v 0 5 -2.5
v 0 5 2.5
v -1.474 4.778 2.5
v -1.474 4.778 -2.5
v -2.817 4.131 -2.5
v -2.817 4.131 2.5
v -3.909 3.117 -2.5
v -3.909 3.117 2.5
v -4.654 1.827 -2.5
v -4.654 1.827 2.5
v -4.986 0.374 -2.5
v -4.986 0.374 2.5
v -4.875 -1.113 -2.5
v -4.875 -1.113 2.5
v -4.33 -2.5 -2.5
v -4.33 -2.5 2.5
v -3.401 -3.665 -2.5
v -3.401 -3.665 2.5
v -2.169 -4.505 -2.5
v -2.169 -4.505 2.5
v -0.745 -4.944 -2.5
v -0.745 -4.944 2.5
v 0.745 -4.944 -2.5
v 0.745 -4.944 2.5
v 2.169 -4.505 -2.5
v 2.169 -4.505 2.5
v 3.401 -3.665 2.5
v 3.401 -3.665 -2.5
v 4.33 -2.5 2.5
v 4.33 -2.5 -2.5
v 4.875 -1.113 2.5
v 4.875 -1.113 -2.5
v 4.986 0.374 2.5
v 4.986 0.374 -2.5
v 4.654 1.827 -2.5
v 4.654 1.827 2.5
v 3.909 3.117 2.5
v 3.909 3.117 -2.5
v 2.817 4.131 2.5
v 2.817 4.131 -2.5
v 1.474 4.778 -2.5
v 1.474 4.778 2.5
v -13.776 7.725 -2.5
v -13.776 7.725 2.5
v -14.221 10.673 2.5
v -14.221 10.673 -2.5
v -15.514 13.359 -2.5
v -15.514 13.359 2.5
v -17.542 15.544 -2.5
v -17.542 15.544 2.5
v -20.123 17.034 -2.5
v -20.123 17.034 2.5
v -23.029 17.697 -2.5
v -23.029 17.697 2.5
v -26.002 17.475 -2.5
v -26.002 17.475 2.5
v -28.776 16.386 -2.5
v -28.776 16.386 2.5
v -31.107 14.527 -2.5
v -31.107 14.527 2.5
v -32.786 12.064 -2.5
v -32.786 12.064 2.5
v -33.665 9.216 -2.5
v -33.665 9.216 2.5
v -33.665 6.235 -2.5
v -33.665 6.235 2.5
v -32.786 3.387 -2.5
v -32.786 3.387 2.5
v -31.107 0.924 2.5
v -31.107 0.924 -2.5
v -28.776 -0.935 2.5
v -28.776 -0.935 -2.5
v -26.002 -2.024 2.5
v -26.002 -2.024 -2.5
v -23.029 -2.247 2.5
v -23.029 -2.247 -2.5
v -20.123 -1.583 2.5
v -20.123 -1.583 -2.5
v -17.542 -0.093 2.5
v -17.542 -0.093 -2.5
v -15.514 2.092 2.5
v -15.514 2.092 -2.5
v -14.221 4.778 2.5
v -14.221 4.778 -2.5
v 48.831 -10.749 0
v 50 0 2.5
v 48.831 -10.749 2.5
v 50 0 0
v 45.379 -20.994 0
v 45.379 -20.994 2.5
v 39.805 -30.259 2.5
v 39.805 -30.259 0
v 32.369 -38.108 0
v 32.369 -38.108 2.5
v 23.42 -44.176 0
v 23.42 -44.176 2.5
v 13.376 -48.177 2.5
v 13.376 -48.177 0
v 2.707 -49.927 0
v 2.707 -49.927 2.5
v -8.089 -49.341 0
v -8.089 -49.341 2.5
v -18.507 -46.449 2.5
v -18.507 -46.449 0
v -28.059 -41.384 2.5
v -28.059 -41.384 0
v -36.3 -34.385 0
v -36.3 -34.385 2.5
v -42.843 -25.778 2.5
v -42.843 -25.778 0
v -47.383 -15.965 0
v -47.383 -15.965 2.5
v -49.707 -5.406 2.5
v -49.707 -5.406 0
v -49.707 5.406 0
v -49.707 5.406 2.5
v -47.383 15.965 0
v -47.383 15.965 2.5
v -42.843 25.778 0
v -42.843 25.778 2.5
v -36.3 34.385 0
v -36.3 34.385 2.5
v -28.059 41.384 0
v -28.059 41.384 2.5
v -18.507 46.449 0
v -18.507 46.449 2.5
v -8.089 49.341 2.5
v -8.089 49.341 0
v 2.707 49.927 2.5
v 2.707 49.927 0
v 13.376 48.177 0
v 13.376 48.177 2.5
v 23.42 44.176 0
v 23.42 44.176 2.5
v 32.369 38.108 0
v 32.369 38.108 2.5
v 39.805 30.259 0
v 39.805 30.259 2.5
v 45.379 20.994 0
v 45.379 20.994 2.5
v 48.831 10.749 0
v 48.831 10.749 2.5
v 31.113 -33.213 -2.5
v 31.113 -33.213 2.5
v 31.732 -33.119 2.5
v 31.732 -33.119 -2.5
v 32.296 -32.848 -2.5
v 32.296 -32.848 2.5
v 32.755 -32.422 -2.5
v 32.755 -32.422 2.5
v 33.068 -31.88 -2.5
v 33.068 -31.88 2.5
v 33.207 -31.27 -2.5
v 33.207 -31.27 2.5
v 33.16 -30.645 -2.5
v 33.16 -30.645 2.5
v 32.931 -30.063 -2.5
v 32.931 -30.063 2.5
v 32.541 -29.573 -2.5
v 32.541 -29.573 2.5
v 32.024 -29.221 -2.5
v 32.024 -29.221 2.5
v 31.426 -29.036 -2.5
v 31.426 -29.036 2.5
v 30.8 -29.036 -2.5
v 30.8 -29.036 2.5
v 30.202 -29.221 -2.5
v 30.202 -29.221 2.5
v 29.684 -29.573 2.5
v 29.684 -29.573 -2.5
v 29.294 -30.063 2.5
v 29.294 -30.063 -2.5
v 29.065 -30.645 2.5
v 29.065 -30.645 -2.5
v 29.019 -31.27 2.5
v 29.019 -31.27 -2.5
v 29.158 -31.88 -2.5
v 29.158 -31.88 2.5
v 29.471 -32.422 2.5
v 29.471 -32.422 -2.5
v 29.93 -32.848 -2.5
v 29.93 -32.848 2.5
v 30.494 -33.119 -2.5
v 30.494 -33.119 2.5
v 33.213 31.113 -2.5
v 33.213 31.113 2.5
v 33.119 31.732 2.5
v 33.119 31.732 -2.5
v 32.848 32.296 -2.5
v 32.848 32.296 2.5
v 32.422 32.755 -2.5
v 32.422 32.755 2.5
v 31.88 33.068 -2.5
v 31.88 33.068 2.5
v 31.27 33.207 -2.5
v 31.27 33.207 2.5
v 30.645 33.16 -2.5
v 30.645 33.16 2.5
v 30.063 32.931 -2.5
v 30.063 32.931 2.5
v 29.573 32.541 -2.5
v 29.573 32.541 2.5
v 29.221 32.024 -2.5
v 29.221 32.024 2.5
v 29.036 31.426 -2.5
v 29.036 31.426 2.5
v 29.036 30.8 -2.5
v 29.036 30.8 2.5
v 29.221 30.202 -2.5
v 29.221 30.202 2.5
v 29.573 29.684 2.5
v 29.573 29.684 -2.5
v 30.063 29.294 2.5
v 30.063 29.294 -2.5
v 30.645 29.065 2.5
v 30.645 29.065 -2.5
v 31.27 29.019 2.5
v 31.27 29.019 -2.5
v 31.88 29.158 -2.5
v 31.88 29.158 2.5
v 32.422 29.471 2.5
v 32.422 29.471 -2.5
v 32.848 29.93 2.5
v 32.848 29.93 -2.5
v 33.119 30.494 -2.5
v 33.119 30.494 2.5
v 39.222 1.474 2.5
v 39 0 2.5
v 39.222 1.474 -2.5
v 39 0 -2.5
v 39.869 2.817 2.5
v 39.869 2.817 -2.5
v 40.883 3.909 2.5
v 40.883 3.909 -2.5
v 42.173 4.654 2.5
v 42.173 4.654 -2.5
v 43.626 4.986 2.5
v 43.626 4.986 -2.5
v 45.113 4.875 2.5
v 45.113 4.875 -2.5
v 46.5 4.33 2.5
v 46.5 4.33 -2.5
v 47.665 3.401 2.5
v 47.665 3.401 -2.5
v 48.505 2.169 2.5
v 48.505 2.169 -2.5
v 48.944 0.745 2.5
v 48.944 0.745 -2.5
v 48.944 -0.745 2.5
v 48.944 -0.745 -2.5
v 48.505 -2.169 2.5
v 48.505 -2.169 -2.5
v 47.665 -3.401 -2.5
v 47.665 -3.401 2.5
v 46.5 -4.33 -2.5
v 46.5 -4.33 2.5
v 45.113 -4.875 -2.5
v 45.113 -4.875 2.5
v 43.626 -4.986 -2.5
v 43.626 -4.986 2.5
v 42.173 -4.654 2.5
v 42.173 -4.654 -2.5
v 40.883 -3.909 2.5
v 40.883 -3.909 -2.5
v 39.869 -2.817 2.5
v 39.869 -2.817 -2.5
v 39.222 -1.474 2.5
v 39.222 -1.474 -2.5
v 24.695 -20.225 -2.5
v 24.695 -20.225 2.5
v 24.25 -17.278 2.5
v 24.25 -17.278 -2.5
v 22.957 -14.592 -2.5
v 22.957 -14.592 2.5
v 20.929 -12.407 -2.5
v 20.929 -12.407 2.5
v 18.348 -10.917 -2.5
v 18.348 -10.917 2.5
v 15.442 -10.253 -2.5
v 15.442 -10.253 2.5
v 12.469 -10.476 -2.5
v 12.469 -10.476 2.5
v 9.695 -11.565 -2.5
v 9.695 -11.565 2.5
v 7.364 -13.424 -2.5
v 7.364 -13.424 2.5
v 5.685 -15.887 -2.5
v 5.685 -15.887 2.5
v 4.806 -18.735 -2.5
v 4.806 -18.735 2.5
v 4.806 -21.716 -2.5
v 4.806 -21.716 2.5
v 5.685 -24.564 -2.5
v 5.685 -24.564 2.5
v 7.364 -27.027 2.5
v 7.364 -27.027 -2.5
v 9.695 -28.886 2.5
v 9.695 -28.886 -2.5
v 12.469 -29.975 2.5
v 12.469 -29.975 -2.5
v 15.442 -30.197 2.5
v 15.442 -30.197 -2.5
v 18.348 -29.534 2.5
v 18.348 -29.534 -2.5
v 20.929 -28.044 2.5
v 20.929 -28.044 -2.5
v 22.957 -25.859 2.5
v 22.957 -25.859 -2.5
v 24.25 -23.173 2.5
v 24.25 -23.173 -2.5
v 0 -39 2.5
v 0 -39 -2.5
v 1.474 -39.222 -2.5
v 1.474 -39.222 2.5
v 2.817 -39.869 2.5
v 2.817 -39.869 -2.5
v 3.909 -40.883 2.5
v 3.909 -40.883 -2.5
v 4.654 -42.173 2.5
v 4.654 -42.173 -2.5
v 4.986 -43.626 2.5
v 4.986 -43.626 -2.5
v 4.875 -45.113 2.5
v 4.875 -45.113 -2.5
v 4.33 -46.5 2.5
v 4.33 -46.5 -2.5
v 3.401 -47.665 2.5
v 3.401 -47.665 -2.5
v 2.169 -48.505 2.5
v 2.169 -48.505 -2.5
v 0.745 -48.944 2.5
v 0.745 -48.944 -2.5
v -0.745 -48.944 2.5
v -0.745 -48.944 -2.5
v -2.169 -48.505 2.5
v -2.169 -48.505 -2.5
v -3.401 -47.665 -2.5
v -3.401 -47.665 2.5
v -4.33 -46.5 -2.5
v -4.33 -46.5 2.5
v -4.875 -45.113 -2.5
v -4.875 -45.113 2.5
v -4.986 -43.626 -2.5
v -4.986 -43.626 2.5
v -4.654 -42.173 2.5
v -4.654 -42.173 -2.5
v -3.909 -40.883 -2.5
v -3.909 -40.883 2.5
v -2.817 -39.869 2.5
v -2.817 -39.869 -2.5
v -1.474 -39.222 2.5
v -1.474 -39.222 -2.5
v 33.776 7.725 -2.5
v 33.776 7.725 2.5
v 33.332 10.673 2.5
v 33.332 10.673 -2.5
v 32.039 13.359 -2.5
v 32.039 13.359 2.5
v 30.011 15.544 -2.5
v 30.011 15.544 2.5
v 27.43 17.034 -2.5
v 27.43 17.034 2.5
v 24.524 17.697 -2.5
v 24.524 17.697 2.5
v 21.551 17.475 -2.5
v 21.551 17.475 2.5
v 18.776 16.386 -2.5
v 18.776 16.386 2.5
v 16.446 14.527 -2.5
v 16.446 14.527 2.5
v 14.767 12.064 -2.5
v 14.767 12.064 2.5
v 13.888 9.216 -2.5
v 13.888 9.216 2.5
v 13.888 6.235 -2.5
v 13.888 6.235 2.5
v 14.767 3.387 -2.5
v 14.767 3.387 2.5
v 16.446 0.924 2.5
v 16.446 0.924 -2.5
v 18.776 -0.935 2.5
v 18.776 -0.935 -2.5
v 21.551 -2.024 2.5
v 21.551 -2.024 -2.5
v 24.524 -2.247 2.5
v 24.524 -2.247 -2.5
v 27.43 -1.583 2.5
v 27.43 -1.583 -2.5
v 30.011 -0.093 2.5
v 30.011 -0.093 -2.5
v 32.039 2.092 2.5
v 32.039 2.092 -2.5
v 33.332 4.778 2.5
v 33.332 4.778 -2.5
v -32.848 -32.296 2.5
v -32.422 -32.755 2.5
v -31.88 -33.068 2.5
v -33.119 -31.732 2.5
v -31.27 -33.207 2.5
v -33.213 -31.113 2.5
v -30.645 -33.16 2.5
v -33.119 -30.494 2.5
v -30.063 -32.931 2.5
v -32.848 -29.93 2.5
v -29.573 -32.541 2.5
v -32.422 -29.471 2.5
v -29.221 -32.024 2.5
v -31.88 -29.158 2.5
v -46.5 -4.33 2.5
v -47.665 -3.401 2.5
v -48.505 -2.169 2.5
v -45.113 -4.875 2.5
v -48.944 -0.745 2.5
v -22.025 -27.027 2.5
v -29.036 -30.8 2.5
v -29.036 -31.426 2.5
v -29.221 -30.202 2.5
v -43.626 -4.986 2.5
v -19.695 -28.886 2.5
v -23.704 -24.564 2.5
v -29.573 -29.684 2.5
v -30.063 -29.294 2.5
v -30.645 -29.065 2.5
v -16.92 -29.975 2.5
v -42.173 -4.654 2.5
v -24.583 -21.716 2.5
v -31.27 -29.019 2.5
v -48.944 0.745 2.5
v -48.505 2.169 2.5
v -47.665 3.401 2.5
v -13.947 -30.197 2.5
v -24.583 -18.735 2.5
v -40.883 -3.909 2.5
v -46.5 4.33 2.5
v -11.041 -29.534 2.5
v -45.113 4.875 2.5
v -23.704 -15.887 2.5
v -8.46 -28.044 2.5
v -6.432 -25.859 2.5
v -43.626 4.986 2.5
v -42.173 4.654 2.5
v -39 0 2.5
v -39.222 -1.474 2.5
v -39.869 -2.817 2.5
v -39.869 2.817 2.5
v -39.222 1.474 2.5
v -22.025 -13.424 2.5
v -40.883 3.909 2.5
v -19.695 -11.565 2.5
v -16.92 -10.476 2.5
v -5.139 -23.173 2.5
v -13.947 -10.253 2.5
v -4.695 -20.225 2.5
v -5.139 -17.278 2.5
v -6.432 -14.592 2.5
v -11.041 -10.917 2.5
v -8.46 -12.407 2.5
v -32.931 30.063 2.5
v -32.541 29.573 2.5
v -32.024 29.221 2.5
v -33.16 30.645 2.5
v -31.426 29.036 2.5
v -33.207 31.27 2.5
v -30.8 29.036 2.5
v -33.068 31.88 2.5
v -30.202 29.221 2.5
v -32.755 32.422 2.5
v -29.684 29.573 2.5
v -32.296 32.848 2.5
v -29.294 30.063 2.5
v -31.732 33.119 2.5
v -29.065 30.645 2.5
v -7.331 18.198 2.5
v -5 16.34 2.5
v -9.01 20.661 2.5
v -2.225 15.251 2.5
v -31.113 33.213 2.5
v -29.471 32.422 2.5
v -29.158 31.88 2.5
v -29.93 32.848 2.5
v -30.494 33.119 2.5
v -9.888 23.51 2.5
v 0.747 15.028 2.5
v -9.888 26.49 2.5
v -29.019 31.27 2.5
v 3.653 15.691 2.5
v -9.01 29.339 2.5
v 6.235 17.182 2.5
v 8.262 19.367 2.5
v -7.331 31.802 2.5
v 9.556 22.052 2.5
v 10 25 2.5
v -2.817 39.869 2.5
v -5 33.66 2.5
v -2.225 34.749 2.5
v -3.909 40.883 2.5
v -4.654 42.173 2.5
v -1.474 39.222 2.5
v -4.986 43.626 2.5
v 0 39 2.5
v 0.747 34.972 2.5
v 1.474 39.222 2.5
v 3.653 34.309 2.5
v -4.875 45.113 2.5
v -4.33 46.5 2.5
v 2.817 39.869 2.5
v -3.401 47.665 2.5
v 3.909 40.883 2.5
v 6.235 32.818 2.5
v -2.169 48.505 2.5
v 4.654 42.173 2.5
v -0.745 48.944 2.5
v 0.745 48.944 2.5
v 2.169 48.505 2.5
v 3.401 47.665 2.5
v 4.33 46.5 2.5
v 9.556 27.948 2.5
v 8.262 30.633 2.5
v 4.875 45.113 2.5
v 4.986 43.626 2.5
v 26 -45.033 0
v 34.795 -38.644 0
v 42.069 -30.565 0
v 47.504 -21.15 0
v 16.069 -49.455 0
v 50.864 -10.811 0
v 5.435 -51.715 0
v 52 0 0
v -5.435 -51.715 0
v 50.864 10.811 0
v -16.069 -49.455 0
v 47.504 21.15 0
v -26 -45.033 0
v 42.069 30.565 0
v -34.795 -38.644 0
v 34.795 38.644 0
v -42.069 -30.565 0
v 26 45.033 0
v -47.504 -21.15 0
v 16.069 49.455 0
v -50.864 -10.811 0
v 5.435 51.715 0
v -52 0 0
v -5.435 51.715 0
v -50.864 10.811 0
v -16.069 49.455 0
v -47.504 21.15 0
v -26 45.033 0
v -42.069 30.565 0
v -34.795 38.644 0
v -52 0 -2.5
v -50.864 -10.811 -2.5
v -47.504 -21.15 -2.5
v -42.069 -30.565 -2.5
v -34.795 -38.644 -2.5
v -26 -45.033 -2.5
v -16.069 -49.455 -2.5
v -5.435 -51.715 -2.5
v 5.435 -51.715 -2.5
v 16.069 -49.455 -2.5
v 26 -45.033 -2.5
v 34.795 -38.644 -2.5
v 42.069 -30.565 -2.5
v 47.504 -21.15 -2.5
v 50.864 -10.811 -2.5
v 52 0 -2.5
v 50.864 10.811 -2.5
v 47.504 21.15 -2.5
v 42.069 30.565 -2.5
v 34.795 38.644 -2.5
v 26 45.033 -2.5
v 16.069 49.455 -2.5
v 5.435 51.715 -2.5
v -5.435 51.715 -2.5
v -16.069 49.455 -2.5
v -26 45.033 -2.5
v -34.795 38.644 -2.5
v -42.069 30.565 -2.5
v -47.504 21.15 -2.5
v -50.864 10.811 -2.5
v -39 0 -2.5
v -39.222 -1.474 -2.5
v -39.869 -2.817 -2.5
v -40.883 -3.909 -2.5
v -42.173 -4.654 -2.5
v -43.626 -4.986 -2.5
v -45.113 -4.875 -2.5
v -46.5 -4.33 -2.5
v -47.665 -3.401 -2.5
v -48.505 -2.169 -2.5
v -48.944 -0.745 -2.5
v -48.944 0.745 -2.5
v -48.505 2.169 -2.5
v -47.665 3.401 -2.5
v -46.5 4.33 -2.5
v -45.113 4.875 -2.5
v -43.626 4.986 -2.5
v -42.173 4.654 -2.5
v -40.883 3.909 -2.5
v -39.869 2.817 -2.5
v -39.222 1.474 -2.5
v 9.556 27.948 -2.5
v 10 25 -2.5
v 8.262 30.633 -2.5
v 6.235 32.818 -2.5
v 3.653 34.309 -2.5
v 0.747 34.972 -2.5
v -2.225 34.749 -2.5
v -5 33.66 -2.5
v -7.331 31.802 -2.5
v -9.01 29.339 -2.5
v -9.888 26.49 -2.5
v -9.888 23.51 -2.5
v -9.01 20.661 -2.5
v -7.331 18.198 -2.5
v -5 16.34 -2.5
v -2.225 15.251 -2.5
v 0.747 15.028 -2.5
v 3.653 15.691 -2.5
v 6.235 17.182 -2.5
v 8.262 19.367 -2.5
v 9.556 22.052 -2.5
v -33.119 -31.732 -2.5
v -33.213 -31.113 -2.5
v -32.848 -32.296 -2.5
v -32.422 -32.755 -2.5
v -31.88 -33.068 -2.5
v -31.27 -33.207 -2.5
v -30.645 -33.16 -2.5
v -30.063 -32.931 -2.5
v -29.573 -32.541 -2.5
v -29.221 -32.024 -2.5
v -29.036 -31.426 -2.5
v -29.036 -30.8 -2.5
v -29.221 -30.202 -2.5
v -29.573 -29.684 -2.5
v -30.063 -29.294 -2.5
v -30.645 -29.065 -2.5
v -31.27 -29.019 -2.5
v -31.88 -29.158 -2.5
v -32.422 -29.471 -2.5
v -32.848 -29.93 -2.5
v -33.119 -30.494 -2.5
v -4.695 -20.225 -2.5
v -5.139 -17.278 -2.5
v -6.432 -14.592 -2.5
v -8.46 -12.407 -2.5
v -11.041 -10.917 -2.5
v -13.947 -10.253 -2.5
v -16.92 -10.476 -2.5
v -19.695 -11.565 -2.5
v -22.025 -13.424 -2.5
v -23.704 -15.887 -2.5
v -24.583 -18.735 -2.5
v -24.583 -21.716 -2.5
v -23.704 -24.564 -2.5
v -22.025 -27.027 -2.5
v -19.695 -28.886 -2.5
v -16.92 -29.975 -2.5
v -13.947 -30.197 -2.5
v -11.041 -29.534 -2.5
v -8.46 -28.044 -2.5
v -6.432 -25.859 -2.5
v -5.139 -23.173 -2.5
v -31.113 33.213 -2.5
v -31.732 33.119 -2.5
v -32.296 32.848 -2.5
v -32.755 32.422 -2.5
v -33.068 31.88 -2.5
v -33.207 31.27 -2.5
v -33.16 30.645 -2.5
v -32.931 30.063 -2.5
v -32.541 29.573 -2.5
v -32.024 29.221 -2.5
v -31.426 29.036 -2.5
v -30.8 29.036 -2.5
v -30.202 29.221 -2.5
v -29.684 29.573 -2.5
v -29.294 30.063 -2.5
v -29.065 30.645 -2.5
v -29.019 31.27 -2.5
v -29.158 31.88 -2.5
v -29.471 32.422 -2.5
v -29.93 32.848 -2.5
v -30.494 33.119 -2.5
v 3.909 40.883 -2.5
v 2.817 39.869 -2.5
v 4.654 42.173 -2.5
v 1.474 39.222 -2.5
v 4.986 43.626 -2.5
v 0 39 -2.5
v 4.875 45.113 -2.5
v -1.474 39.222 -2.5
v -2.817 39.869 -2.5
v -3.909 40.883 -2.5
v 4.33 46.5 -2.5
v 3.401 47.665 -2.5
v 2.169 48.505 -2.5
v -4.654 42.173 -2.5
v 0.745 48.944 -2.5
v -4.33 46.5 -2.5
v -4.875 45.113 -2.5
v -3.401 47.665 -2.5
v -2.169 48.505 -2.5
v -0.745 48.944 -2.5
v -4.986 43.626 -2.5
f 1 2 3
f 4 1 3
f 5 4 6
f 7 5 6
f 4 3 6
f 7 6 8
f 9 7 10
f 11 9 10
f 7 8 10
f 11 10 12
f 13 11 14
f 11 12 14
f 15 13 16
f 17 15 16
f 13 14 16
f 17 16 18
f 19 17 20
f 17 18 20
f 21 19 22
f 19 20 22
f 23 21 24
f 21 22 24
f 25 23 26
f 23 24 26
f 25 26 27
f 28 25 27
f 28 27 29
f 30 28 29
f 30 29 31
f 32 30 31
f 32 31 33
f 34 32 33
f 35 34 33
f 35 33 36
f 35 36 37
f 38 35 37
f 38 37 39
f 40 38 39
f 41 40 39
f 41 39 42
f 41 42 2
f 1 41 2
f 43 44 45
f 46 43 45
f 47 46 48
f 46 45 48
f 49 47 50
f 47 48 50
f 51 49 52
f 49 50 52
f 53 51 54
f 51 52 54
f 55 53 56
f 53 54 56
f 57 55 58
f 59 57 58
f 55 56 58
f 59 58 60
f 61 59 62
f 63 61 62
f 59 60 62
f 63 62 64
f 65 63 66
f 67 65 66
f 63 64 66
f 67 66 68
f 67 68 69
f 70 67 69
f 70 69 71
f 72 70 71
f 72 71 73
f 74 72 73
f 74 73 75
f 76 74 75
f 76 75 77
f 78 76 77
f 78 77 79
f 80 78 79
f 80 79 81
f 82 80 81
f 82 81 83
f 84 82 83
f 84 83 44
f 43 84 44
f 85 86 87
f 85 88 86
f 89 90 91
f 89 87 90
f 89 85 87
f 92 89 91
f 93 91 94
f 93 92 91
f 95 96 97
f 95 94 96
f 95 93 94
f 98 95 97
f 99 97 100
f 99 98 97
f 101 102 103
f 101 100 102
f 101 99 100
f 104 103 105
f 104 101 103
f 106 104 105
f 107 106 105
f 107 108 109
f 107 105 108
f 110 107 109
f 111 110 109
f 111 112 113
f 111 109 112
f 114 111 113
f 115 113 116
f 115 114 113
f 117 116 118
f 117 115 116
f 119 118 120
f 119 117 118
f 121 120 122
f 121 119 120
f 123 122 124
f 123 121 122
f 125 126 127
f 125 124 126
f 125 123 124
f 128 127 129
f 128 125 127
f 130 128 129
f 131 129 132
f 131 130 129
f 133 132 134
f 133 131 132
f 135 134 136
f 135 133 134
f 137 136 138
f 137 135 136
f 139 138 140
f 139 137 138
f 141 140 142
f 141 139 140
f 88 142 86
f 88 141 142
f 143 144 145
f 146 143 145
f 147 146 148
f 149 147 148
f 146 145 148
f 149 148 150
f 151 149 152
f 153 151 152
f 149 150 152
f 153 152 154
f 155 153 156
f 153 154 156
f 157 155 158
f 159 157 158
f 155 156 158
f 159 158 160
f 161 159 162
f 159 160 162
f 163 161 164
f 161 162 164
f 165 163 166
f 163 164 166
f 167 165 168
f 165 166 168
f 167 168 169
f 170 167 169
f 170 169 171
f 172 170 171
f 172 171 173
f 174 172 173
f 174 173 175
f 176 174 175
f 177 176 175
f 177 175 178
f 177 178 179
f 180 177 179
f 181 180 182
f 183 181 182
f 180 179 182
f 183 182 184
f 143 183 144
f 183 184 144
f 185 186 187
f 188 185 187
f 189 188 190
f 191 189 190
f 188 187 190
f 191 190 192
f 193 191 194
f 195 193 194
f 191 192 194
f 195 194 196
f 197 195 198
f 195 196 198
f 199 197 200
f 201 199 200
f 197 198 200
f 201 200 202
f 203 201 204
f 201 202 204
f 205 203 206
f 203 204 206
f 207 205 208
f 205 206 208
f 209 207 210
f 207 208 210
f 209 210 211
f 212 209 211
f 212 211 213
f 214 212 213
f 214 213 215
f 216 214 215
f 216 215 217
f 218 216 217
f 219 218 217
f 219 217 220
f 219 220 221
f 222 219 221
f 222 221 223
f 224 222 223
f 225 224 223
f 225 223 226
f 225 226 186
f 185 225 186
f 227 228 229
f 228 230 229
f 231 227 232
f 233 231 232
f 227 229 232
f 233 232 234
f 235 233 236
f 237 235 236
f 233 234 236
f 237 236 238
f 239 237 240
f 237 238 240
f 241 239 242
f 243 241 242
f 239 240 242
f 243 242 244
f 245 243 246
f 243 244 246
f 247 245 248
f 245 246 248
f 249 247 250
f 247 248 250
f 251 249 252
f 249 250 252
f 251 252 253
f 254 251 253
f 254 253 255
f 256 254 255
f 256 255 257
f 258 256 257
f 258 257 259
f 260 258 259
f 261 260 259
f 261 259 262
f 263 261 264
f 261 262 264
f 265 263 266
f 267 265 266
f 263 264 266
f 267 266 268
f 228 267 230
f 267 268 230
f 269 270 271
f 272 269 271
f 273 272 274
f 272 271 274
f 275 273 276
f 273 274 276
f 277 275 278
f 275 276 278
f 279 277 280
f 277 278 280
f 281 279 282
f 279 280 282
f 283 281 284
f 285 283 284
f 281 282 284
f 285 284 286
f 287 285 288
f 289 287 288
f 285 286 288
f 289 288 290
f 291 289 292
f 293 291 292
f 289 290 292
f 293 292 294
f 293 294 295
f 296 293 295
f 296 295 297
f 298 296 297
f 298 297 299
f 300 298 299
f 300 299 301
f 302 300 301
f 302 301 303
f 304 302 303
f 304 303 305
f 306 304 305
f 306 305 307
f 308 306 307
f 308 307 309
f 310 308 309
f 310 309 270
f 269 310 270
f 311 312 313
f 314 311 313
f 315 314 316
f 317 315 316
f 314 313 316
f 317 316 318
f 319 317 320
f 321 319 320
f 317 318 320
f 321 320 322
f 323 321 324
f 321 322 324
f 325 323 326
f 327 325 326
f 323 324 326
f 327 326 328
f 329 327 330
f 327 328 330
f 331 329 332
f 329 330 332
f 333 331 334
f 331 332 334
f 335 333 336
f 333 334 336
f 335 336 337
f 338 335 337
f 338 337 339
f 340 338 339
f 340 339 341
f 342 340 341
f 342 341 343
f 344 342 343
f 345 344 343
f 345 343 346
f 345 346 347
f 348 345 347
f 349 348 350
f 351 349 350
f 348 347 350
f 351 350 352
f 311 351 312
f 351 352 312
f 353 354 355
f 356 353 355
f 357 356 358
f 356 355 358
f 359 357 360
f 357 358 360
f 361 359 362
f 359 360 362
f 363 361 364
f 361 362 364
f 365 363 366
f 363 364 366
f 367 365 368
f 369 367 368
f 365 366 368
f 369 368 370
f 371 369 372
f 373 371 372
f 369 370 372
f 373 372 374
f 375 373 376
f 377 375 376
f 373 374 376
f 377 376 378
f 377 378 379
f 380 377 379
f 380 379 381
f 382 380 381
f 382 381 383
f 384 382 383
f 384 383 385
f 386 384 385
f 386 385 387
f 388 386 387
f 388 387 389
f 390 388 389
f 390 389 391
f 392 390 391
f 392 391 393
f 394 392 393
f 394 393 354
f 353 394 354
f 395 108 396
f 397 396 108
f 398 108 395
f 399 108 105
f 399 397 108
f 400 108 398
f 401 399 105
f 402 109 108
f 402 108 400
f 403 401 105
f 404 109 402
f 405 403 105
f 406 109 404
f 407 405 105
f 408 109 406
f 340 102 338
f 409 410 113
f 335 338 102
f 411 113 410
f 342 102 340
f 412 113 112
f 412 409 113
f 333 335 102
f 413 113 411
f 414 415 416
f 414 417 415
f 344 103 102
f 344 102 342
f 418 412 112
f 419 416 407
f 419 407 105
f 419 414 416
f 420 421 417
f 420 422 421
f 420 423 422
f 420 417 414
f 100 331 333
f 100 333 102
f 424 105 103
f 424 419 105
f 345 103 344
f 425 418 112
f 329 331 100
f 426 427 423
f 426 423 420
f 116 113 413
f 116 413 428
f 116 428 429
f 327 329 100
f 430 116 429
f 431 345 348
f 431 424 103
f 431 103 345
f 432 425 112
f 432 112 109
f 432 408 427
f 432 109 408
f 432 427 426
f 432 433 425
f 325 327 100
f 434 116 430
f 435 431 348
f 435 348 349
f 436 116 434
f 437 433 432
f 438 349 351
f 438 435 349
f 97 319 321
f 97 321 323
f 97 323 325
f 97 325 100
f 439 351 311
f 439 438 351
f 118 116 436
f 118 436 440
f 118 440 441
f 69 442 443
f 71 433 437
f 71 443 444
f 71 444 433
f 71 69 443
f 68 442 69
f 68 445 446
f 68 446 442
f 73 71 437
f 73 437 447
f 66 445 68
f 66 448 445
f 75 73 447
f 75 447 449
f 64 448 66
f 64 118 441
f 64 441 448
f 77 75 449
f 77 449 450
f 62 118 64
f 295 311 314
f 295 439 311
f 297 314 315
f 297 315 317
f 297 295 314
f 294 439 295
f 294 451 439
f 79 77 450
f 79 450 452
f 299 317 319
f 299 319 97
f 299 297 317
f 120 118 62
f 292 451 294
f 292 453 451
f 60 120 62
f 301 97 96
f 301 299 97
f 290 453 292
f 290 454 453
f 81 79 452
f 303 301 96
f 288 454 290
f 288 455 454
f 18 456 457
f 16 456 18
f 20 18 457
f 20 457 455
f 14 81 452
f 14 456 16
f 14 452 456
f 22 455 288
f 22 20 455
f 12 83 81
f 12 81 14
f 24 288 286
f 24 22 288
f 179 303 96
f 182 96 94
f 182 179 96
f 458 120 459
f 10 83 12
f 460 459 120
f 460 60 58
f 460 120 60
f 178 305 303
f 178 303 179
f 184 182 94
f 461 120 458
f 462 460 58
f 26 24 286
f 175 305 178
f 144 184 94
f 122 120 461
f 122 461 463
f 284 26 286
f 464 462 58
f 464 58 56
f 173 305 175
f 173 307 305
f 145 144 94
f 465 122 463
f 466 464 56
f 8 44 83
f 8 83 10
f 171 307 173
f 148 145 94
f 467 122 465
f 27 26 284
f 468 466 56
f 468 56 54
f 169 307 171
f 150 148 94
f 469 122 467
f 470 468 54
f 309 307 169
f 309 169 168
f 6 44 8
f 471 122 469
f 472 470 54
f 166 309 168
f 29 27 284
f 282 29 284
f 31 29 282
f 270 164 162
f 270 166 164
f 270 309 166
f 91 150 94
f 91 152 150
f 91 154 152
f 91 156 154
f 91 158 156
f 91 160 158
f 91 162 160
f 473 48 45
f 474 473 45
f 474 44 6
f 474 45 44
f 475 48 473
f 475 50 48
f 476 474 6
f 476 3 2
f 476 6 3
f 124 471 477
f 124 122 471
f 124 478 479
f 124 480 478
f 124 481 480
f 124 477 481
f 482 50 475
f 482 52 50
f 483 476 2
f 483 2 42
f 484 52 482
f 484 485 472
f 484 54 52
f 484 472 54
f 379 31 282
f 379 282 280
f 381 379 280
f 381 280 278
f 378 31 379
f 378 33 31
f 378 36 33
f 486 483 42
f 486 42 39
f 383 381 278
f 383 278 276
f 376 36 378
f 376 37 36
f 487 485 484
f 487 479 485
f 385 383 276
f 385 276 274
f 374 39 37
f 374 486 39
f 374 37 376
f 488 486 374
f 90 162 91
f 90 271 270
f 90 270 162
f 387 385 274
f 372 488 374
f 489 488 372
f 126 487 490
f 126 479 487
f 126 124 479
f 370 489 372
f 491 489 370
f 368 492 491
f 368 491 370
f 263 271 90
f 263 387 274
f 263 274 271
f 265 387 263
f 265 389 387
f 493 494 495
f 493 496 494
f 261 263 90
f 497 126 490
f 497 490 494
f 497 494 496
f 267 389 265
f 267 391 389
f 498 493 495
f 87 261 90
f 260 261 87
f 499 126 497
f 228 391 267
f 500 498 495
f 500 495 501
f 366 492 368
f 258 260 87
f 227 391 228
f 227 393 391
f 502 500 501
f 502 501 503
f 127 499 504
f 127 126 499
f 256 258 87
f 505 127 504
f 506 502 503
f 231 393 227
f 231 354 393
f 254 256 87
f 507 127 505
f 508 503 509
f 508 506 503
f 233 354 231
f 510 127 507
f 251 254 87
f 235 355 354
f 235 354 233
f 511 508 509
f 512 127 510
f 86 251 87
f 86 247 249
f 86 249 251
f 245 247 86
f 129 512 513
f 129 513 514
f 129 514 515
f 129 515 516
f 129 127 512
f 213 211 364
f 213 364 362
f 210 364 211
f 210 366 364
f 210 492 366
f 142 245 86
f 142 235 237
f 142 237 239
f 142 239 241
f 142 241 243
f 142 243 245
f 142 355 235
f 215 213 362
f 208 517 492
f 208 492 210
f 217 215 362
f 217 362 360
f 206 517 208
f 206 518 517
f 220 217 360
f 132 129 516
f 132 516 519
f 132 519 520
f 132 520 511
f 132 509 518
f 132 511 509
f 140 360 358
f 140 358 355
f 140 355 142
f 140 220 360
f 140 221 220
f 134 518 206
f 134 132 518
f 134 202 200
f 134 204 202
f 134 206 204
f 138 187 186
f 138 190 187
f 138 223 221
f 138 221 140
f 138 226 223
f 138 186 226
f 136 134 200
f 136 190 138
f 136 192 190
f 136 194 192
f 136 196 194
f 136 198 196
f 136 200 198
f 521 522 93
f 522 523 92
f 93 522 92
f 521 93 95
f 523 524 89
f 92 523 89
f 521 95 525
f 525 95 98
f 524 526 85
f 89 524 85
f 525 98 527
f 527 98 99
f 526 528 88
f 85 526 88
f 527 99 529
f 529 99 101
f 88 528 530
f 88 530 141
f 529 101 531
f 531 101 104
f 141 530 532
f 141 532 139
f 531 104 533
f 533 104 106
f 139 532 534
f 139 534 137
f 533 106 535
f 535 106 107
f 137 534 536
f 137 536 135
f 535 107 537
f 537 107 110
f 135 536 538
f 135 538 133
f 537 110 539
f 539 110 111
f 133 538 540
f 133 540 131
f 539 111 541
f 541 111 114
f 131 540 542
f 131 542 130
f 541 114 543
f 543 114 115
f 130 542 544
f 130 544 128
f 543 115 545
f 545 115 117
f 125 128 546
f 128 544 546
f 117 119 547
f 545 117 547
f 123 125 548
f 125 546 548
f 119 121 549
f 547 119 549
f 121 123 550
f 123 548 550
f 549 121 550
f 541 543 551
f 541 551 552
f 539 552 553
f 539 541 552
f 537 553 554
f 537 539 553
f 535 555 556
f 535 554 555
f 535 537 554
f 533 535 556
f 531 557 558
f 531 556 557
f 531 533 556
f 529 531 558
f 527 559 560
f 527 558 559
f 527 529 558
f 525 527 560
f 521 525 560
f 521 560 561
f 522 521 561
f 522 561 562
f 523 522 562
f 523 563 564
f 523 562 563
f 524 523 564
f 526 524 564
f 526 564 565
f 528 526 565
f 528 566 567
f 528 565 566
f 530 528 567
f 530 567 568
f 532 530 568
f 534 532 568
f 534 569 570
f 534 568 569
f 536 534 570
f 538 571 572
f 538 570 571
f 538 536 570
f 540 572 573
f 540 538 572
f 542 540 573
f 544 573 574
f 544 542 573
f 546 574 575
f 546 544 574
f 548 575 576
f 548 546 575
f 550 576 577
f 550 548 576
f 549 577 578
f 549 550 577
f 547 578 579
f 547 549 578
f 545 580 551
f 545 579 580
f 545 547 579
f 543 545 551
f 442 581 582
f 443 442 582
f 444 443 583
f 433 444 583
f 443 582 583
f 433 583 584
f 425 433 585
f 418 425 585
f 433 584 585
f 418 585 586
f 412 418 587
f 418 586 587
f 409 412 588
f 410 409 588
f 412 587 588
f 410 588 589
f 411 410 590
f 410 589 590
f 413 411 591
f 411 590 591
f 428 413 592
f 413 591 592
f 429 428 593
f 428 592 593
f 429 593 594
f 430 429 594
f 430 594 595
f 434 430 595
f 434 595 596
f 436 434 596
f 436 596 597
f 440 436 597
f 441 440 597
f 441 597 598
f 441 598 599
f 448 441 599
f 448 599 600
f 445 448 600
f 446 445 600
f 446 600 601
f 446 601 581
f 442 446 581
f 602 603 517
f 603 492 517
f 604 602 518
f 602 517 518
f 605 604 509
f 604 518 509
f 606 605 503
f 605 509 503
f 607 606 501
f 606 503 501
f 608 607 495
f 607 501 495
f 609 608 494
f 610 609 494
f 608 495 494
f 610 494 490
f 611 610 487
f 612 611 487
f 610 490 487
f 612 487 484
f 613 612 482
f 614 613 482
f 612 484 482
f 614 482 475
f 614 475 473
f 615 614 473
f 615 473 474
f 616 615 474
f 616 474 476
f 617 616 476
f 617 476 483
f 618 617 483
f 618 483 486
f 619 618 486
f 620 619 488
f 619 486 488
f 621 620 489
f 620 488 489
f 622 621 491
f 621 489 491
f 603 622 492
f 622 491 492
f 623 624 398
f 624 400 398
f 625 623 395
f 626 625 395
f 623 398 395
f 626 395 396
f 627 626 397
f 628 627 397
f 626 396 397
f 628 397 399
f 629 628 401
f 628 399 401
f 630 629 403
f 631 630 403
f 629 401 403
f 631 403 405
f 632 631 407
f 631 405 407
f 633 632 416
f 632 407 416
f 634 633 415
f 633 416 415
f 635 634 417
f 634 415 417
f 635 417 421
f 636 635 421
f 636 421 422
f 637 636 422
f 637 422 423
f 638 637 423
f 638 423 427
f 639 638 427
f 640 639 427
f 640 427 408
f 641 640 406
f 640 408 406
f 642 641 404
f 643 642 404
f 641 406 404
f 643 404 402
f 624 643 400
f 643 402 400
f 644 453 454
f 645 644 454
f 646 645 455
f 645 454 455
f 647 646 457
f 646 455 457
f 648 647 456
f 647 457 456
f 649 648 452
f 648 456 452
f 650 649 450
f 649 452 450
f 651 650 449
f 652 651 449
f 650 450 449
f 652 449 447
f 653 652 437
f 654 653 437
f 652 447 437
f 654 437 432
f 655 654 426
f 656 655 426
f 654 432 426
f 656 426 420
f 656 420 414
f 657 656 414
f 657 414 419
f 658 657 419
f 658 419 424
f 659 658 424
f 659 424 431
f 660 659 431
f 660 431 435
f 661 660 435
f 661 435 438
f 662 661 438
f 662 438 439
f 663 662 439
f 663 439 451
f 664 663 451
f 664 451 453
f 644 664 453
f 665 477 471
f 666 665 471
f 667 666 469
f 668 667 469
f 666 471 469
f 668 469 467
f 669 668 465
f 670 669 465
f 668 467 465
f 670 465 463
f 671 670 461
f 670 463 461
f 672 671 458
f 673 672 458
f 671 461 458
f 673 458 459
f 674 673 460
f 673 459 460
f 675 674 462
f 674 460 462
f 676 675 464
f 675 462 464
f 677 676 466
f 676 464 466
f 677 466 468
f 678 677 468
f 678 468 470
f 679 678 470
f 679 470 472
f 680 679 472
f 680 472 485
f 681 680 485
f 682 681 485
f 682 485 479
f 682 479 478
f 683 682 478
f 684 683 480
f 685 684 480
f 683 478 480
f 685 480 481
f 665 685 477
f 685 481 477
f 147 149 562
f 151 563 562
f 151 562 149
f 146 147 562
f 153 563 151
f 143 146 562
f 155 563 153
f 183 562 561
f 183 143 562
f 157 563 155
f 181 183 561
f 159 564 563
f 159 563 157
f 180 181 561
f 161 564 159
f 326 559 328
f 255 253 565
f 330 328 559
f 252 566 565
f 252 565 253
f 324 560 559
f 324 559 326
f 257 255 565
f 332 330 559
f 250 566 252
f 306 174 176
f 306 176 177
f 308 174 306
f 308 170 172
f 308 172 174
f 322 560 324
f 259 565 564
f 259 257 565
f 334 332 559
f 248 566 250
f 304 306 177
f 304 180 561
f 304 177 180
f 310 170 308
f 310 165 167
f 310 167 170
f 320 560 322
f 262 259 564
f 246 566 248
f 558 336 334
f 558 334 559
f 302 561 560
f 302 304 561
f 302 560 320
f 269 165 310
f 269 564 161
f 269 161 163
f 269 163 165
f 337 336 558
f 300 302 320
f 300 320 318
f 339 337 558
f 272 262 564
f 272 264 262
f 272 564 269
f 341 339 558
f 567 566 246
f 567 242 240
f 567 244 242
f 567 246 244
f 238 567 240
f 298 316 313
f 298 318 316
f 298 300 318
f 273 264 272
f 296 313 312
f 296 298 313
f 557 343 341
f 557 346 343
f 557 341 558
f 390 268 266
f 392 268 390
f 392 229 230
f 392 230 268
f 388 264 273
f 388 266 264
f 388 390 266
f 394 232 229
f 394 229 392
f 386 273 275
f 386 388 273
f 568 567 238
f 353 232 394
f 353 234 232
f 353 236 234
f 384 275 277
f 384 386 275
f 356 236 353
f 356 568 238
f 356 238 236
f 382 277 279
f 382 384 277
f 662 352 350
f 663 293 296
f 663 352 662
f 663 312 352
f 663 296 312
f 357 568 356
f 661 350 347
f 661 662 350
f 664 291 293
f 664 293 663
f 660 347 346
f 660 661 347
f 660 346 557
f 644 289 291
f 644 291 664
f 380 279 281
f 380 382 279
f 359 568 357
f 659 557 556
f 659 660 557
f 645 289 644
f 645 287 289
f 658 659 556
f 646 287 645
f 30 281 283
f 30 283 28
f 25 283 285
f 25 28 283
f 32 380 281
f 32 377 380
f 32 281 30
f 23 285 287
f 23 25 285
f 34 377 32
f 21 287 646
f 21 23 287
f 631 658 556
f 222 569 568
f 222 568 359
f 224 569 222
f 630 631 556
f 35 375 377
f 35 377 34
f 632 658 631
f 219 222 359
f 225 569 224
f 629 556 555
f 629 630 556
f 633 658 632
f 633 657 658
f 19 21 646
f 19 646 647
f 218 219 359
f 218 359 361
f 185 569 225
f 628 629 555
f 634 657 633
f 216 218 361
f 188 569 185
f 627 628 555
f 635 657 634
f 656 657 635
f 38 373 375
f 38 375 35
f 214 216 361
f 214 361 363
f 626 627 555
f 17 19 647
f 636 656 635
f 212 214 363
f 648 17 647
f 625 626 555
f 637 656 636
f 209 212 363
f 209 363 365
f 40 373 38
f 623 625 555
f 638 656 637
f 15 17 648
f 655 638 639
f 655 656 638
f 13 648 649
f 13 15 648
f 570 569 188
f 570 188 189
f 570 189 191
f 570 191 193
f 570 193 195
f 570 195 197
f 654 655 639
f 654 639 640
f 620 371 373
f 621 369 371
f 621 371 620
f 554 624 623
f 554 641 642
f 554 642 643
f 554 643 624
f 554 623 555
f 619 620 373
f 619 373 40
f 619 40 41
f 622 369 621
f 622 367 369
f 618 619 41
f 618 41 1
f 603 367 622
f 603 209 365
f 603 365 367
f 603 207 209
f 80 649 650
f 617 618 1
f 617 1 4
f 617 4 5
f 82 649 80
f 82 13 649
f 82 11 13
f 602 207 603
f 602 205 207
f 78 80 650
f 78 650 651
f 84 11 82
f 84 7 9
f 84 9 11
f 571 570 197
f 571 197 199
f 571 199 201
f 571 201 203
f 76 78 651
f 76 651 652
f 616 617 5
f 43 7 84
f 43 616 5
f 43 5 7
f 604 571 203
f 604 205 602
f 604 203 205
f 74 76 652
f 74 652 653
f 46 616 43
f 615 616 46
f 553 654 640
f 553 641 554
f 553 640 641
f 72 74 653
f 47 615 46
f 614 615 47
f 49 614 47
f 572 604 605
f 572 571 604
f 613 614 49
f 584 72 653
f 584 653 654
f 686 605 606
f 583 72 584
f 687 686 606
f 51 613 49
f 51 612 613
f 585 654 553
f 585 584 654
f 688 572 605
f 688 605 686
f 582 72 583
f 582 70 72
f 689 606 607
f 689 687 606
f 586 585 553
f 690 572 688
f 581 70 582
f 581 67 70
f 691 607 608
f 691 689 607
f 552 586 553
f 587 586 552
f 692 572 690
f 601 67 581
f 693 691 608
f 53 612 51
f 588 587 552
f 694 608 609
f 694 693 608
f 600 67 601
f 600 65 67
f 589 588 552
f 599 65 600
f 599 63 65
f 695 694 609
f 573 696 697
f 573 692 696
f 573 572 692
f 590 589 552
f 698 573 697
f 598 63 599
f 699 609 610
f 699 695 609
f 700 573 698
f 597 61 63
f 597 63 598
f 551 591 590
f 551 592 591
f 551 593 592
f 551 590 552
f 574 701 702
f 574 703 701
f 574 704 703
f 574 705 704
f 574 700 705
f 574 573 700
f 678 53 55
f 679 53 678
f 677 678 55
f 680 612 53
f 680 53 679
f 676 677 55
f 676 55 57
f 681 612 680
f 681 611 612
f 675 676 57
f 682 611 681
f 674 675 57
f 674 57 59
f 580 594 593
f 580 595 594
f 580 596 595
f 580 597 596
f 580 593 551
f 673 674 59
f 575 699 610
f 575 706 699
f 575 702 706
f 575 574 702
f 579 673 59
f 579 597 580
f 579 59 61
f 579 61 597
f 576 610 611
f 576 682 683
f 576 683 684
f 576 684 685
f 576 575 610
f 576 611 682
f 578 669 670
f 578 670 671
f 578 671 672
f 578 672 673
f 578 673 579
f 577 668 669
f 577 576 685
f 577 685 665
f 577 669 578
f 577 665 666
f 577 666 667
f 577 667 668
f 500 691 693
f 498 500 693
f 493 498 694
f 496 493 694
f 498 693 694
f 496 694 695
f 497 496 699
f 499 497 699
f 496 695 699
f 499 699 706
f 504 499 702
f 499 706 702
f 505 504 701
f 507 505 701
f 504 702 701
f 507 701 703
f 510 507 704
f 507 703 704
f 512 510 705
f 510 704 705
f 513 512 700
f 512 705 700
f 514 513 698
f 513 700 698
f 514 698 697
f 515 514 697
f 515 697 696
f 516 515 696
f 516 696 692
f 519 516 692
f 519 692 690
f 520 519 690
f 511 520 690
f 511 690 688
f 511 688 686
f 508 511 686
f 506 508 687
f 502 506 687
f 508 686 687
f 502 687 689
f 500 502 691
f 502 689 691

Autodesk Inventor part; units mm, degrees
ref_plane "YZ Plane" through (0, 0, 0) normal (1, 0, 0) x (0, 1, 0)
ref_plane "XZ Plane" through (0, 0, 0) normal (0, 1, 0) x (-1, 0, 0)
ref_plane "XY Plane" through (0, 0, 0) normal (0, 0, 1) x (1, 0, 0)
sketch "スケッチ1" plane through (0, 0, 0) normal (0, 0, 1) x (1, 0, 0)
  circle A0 centre (0, 0) radius 50
  dimension "d0" = 100
extrude "押し出し1" add sketch "スケッチ1" along normal blind 2.5
sketch "スケッチ2" plane through (0, 0, 0) normal (0, 0, -1) x (-1, 0, 0)
  circle A0 centre (0, 0) radius 52
  dimension "d3" = 104
extrude "押し出し2" add sketch "スケッチ2" along normal blind 2.5
sketch "スケッチ3" plane through (0, 0, -2.5) normal (0, 0, -1) x (-1, 0, 0)
  point P0 (0, 0)
  point P1 (0, 0)
hole "穴1" at (0, 0, -2.5) direction (0, 0, 1) diameter 10 end through all
sketch "スケッチ4" plane through (0, 0, 2.5) normal (0, 0, 1) x (1, 0, 0)
  point P0 (0, 0)
  point P1 (0, 44)
  dimension "d13" = 44
hole "穴2" at (0, 44, 2.5) direction (0, 0, -1) diameter 10 end through all
pattern_circular "円形状パターン1" count 4 over 360 about axis through (0, 0, 144.6632) along (0, 0, -1) of "穴2"
sketch "スケッチ5" plane through (0, 0, -2.5) normal (0, 0, -1) x (-1, 0, 0)
  circle A0 centre (28.7245, 26.8039) radius 17.2489
  circle A1 centre (0, -44) radius 5 projected
  circle A2 centre (0, 0) radius 44
  line L0 (31.1127, 31.1127) -> (0, 0)
  circle A3 centre (0, 44) radius 5 projected
  line L1 (0, 0) -> (0, 44)
  dimension "d24" = 45
hole "穴3" at (-31.1127, 31.1127, -2.5) direction (0, 0, 1) diameter 4.2 end through all
pattern_circular "円形状パターン2" count 4 over 360 about axis through (0, 0, 0) along (0, 0, -1) of "穴3"
sketch "スケッチ6" plane through (0, 0, 2.5) normal (0, 0, 1) x (1, 0, 0)
  circle A0 centre (0, 0) radius 35
  circle A1 centre (0, 0) radius 15
  circle A2 centre (0, 25) radius 10
  circle A3 centre (-23.7764, 7.7254) radius 10
  circle A4 centre (-14.6946, -20.2254) radius 10
  circle A5 centre (14.6946, -20.2254) radius 10
  circle A6 centre (23.7764, 7.7254) radius 10
  dimension "d35" = 70
  dimension "d36" = 30
  dimension "d39" = 360
extrude "押し出し3" cut sketch "スケッチ6" against normal through all contours A6 | A5 | A2 | A4 | A3
properties part number "出力板" material "アルミニウム 6061"
